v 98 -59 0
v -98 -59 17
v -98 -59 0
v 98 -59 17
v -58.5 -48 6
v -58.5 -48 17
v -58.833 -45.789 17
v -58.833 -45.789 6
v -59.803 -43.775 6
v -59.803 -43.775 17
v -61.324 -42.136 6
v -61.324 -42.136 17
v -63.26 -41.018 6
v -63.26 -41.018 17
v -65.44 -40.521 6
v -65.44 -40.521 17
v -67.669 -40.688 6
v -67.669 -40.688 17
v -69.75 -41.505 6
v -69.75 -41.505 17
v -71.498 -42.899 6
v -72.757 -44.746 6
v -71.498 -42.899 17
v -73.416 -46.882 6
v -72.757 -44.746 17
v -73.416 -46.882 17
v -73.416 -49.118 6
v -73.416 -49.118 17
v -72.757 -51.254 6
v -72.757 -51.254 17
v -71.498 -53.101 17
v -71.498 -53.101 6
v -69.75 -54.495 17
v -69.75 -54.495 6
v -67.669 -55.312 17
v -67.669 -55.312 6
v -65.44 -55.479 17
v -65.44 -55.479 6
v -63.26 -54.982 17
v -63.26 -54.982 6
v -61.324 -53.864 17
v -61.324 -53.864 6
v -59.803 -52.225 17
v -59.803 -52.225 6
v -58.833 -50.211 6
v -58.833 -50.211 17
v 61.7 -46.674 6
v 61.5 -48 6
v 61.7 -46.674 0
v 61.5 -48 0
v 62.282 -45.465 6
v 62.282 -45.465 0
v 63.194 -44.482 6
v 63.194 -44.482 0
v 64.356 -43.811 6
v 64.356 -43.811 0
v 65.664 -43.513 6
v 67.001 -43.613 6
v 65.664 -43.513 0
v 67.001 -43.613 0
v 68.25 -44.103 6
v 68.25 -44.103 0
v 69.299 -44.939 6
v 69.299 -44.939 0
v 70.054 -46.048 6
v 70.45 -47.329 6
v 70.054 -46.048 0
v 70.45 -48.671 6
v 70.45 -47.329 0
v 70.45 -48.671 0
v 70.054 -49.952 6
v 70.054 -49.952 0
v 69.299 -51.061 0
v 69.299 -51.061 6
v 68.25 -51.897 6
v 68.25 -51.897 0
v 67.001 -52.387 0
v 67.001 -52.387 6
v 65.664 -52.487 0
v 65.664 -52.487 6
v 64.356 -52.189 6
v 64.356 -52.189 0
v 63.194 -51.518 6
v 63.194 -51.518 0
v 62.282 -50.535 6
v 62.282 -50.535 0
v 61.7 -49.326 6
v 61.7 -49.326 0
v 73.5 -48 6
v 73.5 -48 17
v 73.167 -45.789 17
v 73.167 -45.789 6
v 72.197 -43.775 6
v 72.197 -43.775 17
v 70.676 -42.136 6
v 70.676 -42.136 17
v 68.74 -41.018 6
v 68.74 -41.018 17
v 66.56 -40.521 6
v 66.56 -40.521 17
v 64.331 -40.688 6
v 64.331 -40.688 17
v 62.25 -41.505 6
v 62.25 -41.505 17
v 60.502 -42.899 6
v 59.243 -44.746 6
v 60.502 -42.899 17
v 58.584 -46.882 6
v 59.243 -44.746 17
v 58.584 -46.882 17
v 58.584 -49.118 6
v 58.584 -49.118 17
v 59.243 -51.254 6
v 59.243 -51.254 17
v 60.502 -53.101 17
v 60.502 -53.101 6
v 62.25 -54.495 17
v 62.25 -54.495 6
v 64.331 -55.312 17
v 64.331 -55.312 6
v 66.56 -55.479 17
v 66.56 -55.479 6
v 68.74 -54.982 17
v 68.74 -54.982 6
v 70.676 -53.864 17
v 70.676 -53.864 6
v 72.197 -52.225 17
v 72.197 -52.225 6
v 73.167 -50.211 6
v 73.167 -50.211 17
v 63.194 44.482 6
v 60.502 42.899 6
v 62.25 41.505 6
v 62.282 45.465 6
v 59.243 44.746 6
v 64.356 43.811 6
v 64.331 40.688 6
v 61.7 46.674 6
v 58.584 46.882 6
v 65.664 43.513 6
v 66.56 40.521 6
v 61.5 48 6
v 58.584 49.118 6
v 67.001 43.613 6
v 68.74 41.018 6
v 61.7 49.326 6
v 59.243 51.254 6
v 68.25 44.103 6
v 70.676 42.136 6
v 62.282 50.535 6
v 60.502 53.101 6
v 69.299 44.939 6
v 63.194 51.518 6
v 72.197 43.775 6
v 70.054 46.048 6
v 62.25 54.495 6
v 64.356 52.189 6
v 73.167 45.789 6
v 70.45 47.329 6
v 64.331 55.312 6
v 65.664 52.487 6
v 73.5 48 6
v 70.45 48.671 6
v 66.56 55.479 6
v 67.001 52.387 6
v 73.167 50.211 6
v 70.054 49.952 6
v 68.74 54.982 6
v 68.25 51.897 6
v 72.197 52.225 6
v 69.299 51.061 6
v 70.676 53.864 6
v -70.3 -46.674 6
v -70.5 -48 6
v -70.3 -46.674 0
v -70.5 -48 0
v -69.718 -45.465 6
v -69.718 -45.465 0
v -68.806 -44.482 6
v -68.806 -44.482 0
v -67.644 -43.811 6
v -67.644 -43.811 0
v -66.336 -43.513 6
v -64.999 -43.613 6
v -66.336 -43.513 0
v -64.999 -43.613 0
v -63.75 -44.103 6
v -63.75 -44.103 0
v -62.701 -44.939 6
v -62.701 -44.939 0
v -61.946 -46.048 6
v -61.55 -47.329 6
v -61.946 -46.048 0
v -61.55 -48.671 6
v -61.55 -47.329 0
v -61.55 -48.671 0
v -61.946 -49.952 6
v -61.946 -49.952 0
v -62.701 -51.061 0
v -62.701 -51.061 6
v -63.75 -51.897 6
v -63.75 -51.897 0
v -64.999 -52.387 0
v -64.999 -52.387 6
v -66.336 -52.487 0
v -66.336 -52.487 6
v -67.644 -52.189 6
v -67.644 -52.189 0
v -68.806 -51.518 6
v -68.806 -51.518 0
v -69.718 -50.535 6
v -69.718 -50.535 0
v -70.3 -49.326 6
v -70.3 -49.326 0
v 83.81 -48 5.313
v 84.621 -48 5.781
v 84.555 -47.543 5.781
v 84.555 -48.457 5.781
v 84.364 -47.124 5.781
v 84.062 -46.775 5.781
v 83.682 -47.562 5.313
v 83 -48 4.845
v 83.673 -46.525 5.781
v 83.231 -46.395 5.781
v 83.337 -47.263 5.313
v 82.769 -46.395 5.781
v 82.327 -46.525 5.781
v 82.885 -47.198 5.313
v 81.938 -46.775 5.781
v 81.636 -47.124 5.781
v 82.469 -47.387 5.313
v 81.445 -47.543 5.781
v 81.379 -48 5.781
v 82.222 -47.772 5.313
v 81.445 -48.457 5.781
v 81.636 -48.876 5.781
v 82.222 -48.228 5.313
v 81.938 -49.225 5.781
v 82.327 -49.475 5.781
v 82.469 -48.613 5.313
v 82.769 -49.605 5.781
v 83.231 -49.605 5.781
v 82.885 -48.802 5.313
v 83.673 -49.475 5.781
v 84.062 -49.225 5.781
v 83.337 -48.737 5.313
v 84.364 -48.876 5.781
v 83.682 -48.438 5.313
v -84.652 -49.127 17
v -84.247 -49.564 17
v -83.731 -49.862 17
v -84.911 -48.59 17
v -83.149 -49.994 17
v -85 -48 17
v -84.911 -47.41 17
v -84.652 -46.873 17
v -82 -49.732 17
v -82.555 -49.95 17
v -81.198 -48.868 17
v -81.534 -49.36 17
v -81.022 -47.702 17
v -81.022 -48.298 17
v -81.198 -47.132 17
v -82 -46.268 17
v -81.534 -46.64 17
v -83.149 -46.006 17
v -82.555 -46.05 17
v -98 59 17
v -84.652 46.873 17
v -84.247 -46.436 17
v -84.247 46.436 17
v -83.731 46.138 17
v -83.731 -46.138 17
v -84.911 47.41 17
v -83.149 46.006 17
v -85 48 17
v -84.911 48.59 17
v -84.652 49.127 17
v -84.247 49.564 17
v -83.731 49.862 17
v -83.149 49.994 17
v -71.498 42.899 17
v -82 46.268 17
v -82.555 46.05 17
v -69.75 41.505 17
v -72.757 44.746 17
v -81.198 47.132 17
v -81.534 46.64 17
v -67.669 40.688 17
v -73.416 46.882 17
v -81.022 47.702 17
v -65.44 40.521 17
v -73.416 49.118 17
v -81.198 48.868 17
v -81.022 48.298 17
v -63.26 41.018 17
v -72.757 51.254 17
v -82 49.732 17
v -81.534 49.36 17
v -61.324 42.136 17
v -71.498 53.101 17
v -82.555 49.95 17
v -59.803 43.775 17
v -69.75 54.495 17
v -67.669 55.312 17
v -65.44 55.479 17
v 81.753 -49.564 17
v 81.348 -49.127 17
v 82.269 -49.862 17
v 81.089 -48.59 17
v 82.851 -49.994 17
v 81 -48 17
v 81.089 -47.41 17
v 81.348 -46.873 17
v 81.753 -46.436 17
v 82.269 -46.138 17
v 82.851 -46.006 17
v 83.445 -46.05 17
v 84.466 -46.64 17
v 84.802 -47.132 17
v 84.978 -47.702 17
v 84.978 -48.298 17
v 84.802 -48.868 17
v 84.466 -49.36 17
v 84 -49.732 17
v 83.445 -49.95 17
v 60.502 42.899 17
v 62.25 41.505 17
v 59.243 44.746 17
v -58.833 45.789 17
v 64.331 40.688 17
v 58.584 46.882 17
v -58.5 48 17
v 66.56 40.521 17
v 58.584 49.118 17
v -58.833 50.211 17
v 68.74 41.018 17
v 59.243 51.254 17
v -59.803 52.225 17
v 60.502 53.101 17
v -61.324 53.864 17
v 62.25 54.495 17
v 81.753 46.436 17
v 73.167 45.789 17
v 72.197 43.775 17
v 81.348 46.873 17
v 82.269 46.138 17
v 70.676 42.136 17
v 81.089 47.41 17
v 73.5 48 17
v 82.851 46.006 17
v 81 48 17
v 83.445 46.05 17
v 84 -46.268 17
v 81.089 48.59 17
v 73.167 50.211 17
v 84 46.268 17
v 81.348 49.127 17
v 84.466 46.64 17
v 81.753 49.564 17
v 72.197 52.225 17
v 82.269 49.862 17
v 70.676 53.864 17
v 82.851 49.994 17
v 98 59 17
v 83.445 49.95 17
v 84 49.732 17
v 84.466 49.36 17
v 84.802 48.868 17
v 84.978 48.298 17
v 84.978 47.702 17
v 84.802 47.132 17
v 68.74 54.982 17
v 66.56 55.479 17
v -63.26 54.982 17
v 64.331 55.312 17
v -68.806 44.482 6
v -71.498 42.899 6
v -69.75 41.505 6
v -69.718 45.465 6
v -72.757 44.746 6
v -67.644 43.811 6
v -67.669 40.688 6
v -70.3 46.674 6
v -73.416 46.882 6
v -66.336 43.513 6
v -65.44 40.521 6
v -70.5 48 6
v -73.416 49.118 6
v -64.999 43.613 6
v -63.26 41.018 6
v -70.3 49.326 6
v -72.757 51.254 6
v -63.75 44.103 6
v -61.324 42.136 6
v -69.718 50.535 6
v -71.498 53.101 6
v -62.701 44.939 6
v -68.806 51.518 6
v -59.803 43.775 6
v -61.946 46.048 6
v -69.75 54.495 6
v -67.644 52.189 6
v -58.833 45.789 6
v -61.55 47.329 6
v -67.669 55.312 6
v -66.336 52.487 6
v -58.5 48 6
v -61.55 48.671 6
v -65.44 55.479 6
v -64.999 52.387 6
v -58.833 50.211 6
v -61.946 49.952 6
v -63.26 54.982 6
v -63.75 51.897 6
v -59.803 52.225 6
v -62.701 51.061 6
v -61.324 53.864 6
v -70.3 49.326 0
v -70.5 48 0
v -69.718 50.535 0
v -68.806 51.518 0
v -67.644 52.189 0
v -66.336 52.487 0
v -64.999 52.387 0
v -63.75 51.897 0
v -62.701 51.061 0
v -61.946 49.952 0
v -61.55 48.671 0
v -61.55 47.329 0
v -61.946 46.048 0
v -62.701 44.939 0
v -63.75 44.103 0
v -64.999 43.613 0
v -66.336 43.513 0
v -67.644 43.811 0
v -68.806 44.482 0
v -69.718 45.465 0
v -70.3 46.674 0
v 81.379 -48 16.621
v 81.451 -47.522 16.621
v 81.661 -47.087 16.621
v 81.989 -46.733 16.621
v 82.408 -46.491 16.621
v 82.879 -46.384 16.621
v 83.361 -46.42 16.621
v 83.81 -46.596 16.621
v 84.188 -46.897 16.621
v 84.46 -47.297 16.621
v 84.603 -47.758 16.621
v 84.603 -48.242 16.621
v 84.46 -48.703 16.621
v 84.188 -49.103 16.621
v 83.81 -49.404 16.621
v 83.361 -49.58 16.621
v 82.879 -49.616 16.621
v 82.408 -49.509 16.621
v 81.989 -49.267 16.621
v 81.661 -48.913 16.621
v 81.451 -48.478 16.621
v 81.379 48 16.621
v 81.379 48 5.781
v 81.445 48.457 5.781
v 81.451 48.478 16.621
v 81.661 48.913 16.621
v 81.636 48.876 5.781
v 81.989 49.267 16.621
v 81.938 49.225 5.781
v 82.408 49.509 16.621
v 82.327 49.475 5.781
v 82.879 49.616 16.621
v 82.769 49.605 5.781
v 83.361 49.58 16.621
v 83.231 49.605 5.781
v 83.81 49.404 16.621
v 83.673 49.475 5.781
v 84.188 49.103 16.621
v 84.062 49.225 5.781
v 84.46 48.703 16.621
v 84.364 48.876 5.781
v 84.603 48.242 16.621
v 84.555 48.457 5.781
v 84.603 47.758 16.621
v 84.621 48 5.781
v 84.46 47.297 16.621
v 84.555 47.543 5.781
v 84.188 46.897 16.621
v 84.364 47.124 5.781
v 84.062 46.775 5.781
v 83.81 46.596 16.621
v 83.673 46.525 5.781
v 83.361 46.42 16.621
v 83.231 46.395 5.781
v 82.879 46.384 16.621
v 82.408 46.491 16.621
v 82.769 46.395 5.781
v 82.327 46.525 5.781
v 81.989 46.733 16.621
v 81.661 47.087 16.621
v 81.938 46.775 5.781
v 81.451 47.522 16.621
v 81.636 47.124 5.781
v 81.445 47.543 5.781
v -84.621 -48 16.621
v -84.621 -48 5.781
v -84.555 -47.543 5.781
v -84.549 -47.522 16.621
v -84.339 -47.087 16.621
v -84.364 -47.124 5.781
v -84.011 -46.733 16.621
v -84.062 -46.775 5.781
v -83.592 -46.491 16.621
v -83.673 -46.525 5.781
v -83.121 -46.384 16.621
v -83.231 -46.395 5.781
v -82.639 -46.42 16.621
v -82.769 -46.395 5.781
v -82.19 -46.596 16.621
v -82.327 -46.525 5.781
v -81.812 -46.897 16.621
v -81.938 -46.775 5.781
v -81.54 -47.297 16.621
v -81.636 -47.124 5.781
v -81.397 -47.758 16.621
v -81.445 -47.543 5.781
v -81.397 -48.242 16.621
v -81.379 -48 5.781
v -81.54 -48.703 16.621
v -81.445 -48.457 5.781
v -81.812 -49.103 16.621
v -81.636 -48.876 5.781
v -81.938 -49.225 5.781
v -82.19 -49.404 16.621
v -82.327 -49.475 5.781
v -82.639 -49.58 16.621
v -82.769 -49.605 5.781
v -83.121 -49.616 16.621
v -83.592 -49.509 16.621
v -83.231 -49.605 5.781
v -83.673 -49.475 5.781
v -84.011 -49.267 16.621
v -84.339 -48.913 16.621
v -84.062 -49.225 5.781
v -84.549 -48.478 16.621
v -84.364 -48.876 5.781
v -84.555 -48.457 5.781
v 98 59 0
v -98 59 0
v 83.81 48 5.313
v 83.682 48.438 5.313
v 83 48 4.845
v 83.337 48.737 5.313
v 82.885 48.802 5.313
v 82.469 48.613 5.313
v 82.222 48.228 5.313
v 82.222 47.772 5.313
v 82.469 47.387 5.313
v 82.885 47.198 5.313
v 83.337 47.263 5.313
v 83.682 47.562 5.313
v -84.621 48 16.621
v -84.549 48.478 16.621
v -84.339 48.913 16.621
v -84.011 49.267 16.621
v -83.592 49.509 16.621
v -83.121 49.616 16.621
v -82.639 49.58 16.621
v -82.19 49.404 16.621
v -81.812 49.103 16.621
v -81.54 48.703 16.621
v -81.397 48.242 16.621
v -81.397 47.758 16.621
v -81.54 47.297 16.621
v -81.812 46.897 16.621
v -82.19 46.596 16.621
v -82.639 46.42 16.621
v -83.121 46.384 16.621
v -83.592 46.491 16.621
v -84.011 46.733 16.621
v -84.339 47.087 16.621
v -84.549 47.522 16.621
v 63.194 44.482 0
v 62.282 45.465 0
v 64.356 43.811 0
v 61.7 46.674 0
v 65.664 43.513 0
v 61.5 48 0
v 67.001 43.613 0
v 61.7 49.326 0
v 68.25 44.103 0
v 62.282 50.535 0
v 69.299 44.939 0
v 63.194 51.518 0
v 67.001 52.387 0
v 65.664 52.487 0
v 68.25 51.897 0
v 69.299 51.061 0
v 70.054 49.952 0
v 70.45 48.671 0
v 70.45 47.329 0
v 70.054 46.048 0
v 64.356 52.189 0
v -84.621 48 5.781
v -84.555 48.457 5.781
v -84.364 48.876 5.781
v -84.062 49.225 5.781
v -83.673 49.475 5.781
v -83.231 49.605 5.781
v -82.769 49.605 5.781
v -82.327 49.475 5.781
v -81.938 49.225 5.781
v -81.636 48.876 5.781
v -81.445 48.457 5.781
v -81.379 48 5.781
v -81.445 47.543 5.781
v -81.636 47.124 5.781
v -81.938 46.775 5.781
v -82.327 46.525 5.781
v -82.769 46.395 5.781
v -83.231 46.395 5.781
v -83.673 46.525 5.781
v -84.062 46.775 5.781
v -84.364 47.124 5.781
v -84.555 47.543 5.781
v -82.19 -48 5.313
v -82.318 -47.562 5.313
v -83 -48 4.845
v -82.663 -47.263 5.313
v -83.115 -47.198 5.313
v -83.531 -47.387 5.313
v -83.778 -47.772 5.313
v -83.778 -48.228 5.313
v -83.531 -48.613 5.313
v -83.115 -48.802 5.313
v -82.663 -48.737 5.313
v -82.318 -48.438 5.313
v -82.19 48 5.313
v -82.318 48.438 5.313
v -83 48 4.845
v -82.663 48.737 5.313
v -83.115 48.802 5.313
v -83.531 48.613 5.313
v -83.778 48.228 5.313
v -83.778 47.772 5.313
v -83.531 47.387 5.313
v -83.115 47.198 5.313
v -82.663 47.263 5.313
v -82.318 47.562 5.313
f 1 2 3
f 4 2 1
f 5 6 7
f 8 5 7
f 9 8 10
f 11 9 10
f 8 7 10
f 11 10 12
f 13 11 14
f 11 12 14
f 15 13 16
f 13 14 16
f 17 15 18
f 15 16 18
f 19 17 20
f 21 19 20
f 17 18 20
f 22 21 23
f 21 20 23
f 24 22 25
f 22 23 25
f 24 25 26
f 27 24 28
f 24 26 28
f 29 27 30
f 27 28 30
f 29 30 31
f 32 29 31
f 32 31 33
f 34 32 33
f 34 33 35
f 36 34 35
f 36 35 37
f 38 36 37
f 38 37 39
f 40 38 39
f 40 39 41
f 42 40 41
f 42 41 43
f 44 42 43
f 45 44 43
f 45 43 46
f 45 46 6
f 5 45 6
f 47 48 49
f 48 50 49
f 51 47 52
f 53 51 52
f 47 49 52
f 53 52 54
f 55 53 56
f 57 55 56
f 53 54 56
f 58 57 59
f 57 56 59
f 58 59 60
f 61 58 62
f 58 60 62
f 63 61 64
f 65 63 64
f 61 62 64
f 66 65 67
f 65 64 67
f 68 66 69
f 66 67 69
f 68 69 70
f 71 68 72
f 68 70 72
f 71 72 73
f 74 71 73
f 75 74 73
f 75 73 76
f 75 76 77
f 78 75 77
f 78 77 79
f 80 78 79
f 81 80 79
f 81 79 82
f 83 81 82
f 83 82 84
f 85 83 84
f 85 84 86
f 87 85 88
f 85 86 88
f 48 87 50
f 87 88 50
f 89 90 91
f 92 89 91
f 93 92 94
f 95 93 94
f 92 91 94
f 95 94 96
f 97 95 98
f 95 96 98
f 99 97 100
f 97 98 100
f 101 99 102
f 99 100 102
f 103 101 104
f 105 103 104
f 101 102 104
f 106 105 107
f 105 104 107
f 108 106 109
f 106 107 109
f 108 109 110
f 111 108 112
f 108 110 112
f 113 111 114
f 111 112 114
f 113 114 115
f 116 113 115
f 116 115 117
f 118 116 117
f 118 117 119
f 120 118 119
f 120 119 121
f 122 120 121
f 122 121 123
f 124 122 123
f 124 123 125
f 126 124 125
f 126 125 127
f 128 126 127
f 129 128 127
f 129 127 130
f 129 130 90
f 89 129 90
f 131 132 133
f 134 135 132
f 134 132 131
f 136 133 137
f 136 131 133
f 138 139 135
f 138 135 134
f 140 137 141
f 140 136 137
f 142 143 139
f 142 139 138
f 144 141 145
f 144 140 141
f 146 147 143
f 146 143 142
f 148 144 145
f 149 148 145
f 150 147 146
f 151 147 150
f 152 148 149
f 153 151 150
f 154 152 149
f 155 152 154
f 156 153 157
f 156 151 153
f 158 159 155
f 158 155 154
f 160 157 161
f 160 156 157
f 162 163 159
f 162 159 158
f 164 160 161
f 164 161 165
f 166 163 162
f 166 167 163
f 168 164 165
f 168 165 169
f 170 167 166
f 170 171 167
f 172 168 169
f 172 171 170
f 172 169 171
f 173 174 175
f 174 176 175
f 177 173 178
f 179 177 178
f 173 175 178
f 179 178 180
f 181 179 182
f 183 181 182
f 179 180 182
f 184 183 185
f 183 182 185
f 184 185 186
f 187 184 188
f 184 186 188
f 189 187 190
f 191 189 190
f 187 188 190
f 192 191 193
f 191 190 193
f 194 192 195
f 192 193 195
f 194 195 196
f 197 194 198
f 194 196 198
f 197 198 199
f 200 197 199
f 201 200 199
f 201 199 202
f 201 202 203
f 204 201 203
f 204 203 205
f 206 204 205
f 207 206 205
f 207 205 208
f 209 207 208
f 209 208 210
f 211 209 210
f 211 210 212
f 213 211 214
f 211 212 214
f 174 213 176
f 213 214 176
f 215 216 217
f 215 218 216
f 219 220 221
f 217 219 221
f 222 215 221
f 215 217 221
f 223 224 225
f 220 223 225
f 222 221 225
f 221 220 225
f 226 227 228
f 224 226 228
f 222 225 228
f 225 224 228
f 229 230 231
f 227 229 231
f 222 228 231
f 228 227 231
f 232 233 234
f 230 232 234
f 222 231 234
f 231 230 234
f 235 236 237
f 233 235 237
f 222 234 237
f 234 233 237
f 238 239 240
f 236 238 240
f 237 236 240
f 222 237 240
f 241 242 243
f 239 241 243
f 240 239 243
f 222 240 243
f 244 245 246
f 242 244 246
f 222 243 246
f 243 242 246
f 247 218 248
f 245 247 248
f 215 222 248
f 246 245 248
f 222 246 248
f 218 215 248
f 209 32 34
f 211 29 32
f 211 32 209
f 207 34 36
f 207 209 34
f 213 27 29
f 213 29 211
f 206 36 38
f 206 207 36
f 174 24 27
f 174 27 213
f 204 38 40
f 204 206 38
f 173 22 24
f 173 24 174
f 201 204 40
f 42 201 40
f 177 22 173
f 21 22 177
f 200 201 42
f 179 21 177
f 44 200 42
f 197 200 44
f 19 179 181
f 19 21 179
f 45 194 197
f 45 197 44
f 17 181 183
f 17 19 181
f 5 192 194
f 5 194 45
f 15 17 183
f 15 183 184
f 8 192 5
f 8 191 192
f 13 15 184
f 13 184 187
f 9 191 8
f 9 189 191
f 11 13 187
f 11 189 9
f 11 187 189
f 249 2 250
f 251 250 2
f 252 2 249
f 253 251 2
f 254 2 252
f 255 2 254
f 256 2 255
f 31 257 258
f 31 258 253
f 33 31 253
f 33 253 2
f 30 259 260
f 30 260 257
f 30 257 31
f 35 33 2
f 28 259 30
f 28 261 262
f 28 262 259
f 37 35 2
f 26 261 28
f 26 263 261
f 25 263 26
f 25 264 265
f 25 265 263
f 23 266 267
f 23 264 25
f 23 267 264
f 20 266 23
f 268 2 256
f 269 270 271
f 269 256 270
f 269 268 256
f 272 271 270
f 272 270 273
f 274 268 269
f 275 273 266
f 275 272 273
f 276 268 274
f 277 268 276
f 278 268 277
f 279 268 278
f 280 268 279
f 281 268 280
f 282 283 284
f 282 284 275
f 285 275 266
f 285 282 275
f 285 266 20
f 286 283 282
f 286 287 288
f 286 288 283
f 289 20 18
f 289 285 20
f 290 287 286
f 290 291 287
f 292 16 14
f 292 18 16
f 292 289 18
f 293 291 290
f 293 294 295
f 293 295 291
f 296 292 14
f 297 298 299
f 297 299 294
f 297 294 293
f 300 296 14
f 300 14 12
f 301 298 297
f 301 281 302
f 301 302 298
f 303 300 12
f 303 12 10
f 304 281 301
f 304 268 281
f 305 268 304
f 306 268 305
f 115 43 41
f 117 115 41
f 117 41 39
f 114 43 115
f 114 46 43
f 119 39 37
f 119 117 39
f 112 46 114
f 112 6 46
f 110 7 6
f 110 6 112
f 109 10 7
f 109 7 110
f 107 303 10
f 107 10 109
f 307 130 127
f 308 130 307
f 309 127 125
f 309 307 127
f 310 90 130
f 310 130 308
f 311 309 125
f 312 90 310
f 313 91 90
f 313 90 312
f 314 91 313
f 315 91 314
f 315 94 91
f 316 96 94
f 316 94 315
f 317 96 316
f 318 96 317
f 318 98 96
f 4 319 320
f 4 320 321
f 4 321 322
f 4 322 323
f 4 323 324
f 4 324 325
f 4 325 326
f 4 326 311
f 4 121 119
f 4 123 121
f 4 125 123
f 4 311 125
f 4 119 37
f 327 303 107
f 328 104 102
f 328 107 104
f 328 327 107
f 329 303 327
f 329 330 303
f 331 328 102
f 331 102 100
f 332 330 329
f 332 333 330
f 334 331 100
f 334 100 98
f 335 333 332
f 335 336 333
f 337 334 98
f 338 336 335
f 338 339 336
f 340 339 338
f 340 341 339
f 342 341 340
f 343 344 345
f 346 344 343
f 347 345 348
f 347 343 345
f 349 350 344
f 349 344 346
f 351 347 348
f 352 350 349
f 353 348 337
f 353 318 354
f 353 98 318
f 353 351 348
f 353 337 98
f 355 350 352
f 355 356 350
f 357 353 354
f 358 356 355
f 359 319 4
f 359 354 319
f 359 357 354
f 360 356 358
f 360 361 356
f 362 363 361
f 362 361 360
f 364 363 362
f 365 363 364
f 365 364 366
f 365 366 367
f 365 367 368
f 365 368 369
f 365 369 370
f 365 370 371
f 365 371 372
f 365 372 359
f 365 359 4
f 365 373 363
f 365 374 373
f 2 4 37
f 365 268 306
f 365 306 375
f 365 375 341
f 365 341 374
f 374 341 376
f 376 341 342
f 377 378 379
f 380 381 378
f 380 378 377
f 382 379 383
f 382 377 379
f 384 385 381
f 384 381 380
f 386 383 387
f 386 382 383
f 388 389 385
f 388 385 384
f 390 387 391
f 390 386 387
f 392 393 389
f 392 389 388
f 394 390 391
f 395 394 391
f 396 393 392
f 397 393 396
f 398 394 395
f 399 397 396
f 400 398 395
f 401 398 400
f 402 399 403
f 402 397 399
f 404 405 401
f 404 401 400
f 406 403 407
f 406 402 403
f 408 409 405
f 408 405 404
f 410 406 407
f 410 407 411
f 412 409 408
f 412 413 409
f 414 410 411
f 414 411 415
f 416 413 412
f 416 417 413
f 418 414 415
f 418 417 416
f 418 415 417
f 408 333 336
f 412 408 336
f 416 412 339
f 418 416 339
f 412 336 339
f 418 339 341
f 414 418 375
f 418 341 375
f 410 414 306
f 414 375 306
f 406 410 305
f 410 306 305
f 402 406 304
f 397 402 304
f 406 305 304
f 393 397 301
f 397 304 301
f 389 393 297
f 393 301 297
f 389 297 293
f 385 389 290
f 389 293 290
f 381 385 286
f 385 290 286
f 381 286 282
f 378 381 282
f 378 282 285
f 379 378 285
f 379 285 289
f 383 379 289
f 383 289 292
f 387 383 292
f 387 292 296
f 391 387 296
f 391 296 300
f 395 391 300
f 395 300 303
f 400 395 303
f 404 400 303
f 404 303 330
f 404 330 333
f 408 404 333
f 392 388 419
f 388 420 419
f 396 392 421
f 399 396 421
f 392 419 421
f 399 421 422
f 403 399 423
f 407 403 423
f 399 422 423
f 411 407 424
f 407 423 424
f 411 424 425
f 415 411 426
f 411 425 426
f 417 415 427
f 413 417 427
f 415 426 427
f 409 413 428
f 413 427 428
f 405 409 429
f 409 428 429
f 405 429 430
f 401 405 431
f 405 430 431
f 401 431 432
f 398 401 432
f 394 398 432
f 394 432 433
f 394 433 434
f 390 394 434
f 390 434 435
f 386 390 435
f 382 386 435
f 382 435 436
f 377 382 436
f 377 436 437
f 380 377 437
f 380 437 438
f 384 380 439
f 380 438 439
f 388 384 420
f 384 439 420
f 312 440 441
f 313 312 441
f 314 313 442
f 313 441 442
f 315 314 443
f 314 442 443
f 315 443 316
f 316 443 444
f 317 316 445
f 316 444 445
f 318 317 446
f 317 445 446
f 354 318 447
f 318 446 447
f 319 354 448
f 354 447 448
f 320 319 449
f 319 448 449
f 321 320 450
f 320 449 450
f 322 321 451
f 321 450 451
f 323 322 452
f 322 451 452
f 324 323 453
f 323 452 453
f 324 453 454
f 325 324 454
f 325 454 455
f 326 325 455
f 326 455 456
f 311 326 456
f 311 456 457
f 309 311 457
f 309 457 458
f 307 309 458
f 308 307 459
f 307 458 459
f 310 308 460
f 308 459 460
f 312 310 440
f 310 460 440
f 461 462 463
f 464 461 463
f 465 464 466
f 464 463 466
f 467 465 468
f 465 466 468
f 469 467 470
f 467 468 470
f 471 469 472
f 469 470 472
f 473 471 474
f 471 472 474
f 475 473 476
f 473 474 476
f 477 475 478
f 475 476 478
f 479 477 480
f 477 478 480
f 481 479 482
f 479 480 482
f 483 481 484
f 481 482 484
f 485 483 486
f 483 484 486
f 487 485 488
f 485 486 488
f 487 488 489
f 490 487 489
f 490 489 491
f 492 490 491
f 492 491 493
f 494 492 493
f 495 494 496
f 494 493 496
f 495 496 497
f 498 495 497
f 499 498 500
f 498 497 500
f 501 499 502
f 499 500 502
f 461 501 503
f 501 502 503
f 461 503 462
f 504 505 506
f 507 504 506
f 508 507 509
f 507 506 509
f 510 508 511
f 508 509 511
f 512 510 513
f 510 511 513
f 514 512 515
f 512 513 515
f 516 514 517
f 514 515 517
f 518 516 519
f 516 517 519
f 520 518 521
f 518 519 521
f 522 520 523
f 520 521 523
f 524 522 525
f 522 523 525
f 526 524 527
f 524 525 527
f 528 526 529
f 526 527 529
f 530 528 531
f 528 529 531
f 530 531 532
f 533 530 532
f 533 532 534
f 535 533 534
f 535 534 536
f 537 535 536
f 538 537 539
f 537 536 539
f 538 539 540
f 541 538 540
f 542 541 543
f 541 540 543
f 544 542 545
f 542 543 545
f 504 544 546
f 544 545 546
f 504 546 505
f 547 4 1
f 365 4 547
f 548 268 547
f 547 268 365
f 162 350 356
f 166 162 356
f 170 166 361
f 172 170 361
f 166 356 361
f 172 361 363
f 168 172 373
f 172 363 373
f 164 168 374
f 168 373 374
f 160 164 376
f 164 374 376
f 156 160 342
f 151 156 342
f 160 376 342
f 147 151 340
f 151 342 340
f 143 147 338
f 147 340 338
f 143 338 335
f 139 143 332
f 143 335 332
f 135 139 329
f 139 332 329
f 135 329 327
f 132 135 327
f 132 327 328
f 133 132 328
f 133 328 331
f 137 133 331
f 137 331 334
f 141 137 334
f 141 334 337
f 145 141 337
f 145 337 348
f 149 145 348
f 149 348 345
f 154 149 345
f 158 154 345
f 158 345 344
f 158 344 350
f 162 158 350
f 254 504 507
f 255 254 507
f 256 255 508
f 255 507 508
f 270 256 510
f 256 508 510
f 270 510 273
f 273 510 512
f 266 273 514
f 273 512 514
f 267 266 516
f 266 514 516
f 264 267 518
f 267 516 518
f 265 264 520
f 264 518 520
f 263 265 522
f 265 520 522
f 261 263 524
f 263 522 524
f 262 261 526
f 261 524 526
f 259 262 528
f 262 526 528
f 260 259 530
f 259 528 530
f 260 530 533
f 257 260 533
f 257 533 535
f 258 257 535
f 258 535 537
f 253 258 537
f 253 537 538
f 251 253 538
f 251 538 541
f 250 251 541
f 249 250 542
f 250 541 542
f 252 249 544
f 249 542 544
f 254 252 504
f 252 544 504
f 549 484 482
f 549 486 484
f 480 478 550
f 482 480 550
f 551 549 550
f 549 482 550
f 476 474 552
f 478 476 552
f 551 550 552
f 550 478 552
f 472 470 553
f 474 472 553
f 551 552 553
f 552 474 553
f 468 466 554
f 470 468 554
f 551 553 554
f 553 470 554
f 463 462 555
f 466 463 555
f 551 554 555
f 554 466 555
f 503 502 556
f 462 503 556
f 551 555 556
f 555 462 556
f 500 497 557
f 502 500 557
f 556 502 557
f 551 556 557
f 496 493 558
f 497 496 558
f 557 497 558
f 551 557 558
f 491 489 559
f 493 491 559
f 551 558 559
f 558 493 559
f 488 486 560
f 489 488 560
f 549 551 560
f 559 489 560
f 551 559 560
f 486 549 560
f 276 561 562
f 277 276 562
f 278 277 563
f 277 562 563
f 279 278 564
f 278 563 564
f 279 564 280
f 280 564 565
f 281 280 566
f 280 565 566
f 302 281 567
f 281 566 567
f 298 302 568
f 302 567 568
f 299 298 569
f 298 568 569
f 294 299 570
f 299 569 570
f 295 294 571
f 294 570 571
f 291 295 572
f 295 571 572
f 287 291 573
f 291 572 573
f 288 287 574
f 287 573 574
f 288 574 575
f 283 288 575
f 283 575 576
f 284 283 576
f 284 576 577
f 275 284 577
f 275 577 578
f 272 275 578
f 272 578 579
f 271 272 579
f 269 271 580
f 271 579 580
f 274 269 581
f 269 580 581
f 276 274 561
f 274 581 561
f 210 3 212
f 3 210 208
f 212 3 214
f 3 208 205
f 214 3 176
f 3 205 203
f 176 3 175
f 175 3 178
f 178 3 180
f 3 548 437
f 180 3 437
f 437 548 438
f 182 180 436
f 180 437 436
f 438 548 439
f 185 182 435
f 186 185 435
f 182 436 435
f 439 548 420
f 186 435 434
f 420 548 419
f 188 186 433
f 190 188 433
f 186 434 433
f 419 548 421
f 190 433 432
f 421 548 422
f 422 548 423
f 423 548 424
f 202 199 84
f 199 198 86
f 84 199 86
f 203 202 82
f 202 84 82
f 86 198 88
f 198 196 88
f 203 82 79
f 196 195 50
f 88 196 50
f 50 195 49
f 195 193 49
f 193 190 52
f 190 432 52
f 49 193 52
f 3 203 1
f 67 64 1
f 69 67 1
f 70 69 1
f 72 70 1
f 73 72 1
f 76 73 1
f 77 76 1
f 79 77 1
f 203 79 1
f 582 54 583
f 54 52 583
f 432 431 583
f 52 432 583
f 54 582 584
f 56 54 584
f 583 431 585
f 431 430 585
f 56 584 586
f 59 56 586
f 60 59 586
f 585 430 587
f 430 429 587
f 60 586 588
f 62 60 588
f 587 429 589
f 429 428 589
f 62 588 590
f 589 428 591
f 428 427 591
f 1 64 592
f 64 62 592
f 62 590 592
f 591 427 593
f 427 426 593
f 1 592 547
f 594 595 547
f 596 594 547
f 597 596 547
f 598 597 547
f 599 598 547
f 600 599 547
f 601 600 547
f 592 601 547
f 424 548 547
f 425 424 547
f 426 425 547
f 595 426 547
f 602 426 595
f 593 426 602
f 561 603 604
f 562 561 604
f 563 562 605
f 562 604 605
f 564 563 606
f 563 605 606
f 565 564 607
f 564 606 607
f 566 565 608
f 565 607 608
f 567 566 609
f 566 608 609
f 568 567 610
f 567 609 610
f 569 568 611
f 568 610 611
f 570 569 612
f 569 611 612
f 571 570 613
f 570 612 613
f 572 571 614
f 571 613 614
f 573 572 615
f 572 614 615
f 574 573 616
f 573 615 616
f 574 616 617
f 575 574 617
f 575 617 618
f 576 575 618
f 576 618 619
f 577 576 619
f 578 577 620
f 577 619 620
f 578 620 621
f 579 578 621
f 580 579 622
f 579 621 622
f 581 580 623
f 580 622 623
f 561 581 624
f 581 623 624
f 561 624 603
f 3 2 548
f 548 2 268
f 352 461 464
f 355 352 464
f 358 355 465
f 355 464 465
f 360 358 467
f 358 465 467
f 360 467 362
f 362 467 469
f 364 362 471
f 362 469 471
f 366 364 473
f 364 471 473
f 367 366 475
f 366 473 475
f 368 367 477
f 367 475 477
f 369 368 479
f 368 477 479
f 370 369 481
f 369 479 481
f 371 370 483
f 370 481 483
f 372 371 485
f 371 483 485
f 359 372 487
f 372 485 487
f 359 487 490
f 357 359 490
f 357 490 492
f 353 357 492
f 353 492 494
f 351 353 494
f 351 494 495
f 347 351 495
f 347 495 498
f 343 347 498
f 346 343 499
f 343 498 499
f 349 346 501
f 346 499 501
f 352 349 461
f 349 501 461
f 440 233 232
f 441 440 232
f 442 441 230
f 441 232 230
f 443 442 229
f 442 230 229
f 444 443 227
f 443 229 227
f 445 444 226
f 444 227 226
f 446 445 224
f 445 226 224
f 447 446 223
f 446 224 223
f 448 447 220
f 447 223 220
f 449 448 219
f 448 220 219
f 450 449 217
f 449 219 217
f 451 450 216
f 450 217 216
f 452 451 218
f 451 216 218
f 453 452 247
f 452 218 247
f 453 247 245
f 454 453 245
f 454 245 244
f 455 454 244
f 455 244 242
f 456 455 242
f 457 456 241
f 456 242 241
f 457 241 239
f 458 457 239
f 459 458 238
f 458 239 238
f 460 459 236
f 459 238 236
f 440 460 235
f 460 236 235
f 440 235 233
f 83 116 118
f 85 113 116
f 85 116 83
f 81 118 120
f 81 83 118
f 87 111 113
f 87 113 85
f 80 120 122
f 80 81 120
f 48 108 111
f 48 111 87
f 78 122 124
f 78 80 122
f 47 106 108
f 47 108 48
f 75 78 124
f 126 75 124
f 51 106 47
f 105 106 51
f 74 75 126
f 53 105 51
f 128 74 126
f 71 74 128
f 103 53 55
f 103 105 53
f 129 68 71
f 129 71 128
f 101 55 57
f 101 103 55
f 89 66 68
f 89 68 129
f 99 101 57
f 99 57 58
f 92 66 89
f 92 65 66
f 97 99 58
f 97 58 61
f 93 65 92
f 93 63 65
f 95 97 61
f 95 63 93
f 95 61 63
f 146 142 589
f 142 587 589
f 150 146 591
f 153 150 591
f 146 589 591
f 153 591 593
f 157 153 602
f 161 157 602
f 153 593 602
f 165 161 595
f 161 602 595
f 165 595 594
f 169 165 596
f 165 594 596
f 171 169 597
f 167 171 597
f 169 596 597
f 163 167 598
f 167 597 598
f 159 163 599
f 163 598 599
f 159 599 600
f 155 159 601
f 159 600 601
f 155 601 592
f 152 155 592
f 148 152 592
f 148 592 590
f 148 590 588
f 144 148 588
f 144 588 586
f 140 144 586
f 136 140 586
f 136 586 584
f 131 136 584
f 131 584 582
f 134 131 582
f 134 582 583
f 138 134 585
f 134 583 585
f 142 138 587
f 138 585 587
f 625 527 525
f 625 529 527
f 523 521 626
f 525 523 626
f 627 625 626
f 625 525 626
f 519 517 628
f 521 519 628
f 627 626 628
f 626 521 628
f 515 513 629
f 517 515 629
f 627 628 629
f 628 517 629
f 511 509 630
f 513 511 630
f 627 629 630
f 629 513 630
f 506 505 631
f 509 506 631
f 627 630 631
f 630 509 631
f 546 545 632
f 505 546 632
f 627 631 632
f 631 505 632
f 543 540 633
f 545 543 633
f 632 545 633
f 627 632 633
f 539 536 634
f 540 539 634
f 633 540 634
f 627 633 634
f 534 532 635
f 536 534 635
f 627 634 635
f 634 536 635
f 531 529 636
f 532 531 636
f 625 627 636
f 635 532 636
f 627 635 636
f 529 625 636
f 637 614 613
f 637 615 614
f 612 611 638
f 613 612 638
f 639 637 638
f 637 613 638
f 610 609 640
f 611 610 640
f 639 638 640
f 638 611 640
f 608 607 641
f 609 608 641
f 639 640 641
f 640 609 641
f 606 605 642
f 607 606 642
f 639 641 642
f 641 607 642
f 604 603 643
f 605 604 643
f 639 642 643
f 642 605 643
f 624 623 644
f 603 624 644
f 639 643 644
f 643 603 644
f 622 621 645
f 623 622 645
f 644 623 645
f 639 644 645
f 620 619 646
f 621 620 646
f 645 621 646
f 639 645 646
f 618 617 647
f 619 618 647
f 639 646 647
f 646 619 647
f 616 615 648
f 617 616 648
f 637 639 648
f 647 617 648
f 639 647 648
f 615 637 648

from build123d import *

# Parameters (mm, degrees)
SKETCH_1_W                  = 196
SKETCH_1_H                  = 118
EXTRUDE_1_DEPTH             = 17
HOLE_WIZARD_M31_D           = 3.242
HOLE_WIZARD_M31_DEPTH       = 11.218815752
HOLE_WIZARD_M31_TIP         = 0.935884786
HOLE_WIZARD_M81_D           = 9
HOLE_WIZARD_M81_CBORE_D     = 15
HOLE_WIZARD_M81_CBORE_DEPTH = 11
CHAMFER_1_SIZE              = 0.379


with BuildPart() as part:
    # Эскиз1 → Бобышка-Вытянуть1 (new body)
    with BuildSketch(Plane.XY.offset(17)):
        Rectangle(SKETCH_1_W, SKETCH_1_H)
    extrude(amount=-EXTRUDE_1_DEPTH)

    # Отверстие с зазором M31
    with Locations(Plane.XY.offset(17)):
        with Locations((-83, 48), (-83, -48), (83, 48), (83, -48)):
            Hole(HOLE_WIZARD_M31_D / 2, depth=HOLE_WIZARD_M31_DEPTH)
            with Locations((0, 0, -(HOLE_WIZARD_M31_DEPTH + HOLE_WIZARD_M31_TIP / 2))):  # 120° drill point
                Cone(0, HOLE_WIZARD_M31_D / 2, HOLE_WIZARD_M31_TIP, mode=Mode.SUBTRACT)

    # Цековка для  болта с шестигранной головкой M81 (through all)
    with Locations(Plane.XY.offset(17)):
        with Locations((66, 48), (66, -48), (-66, 48), (-66, -48)):
            CounterBoreHole(HOLE_WIZARD_M81_D / 2, HOLE_WIZARD_M81_CBORE_D / 2, HOLE_WIZARD_M81_CBORE_DEPTH)

    # Фаска1
    chamfer_1_edges = [part.edges().sort_by_distance(p)[0] for p in [
        (84.621, -48, 17),
        (84.621, 48, 17),
        (-81.379, -48, 17),
        (-81.379, 48, 17),
    ]]
    chamfer(chamfer_1_edges, length=CHAMFER_1_SIZE)


solid = part.part
